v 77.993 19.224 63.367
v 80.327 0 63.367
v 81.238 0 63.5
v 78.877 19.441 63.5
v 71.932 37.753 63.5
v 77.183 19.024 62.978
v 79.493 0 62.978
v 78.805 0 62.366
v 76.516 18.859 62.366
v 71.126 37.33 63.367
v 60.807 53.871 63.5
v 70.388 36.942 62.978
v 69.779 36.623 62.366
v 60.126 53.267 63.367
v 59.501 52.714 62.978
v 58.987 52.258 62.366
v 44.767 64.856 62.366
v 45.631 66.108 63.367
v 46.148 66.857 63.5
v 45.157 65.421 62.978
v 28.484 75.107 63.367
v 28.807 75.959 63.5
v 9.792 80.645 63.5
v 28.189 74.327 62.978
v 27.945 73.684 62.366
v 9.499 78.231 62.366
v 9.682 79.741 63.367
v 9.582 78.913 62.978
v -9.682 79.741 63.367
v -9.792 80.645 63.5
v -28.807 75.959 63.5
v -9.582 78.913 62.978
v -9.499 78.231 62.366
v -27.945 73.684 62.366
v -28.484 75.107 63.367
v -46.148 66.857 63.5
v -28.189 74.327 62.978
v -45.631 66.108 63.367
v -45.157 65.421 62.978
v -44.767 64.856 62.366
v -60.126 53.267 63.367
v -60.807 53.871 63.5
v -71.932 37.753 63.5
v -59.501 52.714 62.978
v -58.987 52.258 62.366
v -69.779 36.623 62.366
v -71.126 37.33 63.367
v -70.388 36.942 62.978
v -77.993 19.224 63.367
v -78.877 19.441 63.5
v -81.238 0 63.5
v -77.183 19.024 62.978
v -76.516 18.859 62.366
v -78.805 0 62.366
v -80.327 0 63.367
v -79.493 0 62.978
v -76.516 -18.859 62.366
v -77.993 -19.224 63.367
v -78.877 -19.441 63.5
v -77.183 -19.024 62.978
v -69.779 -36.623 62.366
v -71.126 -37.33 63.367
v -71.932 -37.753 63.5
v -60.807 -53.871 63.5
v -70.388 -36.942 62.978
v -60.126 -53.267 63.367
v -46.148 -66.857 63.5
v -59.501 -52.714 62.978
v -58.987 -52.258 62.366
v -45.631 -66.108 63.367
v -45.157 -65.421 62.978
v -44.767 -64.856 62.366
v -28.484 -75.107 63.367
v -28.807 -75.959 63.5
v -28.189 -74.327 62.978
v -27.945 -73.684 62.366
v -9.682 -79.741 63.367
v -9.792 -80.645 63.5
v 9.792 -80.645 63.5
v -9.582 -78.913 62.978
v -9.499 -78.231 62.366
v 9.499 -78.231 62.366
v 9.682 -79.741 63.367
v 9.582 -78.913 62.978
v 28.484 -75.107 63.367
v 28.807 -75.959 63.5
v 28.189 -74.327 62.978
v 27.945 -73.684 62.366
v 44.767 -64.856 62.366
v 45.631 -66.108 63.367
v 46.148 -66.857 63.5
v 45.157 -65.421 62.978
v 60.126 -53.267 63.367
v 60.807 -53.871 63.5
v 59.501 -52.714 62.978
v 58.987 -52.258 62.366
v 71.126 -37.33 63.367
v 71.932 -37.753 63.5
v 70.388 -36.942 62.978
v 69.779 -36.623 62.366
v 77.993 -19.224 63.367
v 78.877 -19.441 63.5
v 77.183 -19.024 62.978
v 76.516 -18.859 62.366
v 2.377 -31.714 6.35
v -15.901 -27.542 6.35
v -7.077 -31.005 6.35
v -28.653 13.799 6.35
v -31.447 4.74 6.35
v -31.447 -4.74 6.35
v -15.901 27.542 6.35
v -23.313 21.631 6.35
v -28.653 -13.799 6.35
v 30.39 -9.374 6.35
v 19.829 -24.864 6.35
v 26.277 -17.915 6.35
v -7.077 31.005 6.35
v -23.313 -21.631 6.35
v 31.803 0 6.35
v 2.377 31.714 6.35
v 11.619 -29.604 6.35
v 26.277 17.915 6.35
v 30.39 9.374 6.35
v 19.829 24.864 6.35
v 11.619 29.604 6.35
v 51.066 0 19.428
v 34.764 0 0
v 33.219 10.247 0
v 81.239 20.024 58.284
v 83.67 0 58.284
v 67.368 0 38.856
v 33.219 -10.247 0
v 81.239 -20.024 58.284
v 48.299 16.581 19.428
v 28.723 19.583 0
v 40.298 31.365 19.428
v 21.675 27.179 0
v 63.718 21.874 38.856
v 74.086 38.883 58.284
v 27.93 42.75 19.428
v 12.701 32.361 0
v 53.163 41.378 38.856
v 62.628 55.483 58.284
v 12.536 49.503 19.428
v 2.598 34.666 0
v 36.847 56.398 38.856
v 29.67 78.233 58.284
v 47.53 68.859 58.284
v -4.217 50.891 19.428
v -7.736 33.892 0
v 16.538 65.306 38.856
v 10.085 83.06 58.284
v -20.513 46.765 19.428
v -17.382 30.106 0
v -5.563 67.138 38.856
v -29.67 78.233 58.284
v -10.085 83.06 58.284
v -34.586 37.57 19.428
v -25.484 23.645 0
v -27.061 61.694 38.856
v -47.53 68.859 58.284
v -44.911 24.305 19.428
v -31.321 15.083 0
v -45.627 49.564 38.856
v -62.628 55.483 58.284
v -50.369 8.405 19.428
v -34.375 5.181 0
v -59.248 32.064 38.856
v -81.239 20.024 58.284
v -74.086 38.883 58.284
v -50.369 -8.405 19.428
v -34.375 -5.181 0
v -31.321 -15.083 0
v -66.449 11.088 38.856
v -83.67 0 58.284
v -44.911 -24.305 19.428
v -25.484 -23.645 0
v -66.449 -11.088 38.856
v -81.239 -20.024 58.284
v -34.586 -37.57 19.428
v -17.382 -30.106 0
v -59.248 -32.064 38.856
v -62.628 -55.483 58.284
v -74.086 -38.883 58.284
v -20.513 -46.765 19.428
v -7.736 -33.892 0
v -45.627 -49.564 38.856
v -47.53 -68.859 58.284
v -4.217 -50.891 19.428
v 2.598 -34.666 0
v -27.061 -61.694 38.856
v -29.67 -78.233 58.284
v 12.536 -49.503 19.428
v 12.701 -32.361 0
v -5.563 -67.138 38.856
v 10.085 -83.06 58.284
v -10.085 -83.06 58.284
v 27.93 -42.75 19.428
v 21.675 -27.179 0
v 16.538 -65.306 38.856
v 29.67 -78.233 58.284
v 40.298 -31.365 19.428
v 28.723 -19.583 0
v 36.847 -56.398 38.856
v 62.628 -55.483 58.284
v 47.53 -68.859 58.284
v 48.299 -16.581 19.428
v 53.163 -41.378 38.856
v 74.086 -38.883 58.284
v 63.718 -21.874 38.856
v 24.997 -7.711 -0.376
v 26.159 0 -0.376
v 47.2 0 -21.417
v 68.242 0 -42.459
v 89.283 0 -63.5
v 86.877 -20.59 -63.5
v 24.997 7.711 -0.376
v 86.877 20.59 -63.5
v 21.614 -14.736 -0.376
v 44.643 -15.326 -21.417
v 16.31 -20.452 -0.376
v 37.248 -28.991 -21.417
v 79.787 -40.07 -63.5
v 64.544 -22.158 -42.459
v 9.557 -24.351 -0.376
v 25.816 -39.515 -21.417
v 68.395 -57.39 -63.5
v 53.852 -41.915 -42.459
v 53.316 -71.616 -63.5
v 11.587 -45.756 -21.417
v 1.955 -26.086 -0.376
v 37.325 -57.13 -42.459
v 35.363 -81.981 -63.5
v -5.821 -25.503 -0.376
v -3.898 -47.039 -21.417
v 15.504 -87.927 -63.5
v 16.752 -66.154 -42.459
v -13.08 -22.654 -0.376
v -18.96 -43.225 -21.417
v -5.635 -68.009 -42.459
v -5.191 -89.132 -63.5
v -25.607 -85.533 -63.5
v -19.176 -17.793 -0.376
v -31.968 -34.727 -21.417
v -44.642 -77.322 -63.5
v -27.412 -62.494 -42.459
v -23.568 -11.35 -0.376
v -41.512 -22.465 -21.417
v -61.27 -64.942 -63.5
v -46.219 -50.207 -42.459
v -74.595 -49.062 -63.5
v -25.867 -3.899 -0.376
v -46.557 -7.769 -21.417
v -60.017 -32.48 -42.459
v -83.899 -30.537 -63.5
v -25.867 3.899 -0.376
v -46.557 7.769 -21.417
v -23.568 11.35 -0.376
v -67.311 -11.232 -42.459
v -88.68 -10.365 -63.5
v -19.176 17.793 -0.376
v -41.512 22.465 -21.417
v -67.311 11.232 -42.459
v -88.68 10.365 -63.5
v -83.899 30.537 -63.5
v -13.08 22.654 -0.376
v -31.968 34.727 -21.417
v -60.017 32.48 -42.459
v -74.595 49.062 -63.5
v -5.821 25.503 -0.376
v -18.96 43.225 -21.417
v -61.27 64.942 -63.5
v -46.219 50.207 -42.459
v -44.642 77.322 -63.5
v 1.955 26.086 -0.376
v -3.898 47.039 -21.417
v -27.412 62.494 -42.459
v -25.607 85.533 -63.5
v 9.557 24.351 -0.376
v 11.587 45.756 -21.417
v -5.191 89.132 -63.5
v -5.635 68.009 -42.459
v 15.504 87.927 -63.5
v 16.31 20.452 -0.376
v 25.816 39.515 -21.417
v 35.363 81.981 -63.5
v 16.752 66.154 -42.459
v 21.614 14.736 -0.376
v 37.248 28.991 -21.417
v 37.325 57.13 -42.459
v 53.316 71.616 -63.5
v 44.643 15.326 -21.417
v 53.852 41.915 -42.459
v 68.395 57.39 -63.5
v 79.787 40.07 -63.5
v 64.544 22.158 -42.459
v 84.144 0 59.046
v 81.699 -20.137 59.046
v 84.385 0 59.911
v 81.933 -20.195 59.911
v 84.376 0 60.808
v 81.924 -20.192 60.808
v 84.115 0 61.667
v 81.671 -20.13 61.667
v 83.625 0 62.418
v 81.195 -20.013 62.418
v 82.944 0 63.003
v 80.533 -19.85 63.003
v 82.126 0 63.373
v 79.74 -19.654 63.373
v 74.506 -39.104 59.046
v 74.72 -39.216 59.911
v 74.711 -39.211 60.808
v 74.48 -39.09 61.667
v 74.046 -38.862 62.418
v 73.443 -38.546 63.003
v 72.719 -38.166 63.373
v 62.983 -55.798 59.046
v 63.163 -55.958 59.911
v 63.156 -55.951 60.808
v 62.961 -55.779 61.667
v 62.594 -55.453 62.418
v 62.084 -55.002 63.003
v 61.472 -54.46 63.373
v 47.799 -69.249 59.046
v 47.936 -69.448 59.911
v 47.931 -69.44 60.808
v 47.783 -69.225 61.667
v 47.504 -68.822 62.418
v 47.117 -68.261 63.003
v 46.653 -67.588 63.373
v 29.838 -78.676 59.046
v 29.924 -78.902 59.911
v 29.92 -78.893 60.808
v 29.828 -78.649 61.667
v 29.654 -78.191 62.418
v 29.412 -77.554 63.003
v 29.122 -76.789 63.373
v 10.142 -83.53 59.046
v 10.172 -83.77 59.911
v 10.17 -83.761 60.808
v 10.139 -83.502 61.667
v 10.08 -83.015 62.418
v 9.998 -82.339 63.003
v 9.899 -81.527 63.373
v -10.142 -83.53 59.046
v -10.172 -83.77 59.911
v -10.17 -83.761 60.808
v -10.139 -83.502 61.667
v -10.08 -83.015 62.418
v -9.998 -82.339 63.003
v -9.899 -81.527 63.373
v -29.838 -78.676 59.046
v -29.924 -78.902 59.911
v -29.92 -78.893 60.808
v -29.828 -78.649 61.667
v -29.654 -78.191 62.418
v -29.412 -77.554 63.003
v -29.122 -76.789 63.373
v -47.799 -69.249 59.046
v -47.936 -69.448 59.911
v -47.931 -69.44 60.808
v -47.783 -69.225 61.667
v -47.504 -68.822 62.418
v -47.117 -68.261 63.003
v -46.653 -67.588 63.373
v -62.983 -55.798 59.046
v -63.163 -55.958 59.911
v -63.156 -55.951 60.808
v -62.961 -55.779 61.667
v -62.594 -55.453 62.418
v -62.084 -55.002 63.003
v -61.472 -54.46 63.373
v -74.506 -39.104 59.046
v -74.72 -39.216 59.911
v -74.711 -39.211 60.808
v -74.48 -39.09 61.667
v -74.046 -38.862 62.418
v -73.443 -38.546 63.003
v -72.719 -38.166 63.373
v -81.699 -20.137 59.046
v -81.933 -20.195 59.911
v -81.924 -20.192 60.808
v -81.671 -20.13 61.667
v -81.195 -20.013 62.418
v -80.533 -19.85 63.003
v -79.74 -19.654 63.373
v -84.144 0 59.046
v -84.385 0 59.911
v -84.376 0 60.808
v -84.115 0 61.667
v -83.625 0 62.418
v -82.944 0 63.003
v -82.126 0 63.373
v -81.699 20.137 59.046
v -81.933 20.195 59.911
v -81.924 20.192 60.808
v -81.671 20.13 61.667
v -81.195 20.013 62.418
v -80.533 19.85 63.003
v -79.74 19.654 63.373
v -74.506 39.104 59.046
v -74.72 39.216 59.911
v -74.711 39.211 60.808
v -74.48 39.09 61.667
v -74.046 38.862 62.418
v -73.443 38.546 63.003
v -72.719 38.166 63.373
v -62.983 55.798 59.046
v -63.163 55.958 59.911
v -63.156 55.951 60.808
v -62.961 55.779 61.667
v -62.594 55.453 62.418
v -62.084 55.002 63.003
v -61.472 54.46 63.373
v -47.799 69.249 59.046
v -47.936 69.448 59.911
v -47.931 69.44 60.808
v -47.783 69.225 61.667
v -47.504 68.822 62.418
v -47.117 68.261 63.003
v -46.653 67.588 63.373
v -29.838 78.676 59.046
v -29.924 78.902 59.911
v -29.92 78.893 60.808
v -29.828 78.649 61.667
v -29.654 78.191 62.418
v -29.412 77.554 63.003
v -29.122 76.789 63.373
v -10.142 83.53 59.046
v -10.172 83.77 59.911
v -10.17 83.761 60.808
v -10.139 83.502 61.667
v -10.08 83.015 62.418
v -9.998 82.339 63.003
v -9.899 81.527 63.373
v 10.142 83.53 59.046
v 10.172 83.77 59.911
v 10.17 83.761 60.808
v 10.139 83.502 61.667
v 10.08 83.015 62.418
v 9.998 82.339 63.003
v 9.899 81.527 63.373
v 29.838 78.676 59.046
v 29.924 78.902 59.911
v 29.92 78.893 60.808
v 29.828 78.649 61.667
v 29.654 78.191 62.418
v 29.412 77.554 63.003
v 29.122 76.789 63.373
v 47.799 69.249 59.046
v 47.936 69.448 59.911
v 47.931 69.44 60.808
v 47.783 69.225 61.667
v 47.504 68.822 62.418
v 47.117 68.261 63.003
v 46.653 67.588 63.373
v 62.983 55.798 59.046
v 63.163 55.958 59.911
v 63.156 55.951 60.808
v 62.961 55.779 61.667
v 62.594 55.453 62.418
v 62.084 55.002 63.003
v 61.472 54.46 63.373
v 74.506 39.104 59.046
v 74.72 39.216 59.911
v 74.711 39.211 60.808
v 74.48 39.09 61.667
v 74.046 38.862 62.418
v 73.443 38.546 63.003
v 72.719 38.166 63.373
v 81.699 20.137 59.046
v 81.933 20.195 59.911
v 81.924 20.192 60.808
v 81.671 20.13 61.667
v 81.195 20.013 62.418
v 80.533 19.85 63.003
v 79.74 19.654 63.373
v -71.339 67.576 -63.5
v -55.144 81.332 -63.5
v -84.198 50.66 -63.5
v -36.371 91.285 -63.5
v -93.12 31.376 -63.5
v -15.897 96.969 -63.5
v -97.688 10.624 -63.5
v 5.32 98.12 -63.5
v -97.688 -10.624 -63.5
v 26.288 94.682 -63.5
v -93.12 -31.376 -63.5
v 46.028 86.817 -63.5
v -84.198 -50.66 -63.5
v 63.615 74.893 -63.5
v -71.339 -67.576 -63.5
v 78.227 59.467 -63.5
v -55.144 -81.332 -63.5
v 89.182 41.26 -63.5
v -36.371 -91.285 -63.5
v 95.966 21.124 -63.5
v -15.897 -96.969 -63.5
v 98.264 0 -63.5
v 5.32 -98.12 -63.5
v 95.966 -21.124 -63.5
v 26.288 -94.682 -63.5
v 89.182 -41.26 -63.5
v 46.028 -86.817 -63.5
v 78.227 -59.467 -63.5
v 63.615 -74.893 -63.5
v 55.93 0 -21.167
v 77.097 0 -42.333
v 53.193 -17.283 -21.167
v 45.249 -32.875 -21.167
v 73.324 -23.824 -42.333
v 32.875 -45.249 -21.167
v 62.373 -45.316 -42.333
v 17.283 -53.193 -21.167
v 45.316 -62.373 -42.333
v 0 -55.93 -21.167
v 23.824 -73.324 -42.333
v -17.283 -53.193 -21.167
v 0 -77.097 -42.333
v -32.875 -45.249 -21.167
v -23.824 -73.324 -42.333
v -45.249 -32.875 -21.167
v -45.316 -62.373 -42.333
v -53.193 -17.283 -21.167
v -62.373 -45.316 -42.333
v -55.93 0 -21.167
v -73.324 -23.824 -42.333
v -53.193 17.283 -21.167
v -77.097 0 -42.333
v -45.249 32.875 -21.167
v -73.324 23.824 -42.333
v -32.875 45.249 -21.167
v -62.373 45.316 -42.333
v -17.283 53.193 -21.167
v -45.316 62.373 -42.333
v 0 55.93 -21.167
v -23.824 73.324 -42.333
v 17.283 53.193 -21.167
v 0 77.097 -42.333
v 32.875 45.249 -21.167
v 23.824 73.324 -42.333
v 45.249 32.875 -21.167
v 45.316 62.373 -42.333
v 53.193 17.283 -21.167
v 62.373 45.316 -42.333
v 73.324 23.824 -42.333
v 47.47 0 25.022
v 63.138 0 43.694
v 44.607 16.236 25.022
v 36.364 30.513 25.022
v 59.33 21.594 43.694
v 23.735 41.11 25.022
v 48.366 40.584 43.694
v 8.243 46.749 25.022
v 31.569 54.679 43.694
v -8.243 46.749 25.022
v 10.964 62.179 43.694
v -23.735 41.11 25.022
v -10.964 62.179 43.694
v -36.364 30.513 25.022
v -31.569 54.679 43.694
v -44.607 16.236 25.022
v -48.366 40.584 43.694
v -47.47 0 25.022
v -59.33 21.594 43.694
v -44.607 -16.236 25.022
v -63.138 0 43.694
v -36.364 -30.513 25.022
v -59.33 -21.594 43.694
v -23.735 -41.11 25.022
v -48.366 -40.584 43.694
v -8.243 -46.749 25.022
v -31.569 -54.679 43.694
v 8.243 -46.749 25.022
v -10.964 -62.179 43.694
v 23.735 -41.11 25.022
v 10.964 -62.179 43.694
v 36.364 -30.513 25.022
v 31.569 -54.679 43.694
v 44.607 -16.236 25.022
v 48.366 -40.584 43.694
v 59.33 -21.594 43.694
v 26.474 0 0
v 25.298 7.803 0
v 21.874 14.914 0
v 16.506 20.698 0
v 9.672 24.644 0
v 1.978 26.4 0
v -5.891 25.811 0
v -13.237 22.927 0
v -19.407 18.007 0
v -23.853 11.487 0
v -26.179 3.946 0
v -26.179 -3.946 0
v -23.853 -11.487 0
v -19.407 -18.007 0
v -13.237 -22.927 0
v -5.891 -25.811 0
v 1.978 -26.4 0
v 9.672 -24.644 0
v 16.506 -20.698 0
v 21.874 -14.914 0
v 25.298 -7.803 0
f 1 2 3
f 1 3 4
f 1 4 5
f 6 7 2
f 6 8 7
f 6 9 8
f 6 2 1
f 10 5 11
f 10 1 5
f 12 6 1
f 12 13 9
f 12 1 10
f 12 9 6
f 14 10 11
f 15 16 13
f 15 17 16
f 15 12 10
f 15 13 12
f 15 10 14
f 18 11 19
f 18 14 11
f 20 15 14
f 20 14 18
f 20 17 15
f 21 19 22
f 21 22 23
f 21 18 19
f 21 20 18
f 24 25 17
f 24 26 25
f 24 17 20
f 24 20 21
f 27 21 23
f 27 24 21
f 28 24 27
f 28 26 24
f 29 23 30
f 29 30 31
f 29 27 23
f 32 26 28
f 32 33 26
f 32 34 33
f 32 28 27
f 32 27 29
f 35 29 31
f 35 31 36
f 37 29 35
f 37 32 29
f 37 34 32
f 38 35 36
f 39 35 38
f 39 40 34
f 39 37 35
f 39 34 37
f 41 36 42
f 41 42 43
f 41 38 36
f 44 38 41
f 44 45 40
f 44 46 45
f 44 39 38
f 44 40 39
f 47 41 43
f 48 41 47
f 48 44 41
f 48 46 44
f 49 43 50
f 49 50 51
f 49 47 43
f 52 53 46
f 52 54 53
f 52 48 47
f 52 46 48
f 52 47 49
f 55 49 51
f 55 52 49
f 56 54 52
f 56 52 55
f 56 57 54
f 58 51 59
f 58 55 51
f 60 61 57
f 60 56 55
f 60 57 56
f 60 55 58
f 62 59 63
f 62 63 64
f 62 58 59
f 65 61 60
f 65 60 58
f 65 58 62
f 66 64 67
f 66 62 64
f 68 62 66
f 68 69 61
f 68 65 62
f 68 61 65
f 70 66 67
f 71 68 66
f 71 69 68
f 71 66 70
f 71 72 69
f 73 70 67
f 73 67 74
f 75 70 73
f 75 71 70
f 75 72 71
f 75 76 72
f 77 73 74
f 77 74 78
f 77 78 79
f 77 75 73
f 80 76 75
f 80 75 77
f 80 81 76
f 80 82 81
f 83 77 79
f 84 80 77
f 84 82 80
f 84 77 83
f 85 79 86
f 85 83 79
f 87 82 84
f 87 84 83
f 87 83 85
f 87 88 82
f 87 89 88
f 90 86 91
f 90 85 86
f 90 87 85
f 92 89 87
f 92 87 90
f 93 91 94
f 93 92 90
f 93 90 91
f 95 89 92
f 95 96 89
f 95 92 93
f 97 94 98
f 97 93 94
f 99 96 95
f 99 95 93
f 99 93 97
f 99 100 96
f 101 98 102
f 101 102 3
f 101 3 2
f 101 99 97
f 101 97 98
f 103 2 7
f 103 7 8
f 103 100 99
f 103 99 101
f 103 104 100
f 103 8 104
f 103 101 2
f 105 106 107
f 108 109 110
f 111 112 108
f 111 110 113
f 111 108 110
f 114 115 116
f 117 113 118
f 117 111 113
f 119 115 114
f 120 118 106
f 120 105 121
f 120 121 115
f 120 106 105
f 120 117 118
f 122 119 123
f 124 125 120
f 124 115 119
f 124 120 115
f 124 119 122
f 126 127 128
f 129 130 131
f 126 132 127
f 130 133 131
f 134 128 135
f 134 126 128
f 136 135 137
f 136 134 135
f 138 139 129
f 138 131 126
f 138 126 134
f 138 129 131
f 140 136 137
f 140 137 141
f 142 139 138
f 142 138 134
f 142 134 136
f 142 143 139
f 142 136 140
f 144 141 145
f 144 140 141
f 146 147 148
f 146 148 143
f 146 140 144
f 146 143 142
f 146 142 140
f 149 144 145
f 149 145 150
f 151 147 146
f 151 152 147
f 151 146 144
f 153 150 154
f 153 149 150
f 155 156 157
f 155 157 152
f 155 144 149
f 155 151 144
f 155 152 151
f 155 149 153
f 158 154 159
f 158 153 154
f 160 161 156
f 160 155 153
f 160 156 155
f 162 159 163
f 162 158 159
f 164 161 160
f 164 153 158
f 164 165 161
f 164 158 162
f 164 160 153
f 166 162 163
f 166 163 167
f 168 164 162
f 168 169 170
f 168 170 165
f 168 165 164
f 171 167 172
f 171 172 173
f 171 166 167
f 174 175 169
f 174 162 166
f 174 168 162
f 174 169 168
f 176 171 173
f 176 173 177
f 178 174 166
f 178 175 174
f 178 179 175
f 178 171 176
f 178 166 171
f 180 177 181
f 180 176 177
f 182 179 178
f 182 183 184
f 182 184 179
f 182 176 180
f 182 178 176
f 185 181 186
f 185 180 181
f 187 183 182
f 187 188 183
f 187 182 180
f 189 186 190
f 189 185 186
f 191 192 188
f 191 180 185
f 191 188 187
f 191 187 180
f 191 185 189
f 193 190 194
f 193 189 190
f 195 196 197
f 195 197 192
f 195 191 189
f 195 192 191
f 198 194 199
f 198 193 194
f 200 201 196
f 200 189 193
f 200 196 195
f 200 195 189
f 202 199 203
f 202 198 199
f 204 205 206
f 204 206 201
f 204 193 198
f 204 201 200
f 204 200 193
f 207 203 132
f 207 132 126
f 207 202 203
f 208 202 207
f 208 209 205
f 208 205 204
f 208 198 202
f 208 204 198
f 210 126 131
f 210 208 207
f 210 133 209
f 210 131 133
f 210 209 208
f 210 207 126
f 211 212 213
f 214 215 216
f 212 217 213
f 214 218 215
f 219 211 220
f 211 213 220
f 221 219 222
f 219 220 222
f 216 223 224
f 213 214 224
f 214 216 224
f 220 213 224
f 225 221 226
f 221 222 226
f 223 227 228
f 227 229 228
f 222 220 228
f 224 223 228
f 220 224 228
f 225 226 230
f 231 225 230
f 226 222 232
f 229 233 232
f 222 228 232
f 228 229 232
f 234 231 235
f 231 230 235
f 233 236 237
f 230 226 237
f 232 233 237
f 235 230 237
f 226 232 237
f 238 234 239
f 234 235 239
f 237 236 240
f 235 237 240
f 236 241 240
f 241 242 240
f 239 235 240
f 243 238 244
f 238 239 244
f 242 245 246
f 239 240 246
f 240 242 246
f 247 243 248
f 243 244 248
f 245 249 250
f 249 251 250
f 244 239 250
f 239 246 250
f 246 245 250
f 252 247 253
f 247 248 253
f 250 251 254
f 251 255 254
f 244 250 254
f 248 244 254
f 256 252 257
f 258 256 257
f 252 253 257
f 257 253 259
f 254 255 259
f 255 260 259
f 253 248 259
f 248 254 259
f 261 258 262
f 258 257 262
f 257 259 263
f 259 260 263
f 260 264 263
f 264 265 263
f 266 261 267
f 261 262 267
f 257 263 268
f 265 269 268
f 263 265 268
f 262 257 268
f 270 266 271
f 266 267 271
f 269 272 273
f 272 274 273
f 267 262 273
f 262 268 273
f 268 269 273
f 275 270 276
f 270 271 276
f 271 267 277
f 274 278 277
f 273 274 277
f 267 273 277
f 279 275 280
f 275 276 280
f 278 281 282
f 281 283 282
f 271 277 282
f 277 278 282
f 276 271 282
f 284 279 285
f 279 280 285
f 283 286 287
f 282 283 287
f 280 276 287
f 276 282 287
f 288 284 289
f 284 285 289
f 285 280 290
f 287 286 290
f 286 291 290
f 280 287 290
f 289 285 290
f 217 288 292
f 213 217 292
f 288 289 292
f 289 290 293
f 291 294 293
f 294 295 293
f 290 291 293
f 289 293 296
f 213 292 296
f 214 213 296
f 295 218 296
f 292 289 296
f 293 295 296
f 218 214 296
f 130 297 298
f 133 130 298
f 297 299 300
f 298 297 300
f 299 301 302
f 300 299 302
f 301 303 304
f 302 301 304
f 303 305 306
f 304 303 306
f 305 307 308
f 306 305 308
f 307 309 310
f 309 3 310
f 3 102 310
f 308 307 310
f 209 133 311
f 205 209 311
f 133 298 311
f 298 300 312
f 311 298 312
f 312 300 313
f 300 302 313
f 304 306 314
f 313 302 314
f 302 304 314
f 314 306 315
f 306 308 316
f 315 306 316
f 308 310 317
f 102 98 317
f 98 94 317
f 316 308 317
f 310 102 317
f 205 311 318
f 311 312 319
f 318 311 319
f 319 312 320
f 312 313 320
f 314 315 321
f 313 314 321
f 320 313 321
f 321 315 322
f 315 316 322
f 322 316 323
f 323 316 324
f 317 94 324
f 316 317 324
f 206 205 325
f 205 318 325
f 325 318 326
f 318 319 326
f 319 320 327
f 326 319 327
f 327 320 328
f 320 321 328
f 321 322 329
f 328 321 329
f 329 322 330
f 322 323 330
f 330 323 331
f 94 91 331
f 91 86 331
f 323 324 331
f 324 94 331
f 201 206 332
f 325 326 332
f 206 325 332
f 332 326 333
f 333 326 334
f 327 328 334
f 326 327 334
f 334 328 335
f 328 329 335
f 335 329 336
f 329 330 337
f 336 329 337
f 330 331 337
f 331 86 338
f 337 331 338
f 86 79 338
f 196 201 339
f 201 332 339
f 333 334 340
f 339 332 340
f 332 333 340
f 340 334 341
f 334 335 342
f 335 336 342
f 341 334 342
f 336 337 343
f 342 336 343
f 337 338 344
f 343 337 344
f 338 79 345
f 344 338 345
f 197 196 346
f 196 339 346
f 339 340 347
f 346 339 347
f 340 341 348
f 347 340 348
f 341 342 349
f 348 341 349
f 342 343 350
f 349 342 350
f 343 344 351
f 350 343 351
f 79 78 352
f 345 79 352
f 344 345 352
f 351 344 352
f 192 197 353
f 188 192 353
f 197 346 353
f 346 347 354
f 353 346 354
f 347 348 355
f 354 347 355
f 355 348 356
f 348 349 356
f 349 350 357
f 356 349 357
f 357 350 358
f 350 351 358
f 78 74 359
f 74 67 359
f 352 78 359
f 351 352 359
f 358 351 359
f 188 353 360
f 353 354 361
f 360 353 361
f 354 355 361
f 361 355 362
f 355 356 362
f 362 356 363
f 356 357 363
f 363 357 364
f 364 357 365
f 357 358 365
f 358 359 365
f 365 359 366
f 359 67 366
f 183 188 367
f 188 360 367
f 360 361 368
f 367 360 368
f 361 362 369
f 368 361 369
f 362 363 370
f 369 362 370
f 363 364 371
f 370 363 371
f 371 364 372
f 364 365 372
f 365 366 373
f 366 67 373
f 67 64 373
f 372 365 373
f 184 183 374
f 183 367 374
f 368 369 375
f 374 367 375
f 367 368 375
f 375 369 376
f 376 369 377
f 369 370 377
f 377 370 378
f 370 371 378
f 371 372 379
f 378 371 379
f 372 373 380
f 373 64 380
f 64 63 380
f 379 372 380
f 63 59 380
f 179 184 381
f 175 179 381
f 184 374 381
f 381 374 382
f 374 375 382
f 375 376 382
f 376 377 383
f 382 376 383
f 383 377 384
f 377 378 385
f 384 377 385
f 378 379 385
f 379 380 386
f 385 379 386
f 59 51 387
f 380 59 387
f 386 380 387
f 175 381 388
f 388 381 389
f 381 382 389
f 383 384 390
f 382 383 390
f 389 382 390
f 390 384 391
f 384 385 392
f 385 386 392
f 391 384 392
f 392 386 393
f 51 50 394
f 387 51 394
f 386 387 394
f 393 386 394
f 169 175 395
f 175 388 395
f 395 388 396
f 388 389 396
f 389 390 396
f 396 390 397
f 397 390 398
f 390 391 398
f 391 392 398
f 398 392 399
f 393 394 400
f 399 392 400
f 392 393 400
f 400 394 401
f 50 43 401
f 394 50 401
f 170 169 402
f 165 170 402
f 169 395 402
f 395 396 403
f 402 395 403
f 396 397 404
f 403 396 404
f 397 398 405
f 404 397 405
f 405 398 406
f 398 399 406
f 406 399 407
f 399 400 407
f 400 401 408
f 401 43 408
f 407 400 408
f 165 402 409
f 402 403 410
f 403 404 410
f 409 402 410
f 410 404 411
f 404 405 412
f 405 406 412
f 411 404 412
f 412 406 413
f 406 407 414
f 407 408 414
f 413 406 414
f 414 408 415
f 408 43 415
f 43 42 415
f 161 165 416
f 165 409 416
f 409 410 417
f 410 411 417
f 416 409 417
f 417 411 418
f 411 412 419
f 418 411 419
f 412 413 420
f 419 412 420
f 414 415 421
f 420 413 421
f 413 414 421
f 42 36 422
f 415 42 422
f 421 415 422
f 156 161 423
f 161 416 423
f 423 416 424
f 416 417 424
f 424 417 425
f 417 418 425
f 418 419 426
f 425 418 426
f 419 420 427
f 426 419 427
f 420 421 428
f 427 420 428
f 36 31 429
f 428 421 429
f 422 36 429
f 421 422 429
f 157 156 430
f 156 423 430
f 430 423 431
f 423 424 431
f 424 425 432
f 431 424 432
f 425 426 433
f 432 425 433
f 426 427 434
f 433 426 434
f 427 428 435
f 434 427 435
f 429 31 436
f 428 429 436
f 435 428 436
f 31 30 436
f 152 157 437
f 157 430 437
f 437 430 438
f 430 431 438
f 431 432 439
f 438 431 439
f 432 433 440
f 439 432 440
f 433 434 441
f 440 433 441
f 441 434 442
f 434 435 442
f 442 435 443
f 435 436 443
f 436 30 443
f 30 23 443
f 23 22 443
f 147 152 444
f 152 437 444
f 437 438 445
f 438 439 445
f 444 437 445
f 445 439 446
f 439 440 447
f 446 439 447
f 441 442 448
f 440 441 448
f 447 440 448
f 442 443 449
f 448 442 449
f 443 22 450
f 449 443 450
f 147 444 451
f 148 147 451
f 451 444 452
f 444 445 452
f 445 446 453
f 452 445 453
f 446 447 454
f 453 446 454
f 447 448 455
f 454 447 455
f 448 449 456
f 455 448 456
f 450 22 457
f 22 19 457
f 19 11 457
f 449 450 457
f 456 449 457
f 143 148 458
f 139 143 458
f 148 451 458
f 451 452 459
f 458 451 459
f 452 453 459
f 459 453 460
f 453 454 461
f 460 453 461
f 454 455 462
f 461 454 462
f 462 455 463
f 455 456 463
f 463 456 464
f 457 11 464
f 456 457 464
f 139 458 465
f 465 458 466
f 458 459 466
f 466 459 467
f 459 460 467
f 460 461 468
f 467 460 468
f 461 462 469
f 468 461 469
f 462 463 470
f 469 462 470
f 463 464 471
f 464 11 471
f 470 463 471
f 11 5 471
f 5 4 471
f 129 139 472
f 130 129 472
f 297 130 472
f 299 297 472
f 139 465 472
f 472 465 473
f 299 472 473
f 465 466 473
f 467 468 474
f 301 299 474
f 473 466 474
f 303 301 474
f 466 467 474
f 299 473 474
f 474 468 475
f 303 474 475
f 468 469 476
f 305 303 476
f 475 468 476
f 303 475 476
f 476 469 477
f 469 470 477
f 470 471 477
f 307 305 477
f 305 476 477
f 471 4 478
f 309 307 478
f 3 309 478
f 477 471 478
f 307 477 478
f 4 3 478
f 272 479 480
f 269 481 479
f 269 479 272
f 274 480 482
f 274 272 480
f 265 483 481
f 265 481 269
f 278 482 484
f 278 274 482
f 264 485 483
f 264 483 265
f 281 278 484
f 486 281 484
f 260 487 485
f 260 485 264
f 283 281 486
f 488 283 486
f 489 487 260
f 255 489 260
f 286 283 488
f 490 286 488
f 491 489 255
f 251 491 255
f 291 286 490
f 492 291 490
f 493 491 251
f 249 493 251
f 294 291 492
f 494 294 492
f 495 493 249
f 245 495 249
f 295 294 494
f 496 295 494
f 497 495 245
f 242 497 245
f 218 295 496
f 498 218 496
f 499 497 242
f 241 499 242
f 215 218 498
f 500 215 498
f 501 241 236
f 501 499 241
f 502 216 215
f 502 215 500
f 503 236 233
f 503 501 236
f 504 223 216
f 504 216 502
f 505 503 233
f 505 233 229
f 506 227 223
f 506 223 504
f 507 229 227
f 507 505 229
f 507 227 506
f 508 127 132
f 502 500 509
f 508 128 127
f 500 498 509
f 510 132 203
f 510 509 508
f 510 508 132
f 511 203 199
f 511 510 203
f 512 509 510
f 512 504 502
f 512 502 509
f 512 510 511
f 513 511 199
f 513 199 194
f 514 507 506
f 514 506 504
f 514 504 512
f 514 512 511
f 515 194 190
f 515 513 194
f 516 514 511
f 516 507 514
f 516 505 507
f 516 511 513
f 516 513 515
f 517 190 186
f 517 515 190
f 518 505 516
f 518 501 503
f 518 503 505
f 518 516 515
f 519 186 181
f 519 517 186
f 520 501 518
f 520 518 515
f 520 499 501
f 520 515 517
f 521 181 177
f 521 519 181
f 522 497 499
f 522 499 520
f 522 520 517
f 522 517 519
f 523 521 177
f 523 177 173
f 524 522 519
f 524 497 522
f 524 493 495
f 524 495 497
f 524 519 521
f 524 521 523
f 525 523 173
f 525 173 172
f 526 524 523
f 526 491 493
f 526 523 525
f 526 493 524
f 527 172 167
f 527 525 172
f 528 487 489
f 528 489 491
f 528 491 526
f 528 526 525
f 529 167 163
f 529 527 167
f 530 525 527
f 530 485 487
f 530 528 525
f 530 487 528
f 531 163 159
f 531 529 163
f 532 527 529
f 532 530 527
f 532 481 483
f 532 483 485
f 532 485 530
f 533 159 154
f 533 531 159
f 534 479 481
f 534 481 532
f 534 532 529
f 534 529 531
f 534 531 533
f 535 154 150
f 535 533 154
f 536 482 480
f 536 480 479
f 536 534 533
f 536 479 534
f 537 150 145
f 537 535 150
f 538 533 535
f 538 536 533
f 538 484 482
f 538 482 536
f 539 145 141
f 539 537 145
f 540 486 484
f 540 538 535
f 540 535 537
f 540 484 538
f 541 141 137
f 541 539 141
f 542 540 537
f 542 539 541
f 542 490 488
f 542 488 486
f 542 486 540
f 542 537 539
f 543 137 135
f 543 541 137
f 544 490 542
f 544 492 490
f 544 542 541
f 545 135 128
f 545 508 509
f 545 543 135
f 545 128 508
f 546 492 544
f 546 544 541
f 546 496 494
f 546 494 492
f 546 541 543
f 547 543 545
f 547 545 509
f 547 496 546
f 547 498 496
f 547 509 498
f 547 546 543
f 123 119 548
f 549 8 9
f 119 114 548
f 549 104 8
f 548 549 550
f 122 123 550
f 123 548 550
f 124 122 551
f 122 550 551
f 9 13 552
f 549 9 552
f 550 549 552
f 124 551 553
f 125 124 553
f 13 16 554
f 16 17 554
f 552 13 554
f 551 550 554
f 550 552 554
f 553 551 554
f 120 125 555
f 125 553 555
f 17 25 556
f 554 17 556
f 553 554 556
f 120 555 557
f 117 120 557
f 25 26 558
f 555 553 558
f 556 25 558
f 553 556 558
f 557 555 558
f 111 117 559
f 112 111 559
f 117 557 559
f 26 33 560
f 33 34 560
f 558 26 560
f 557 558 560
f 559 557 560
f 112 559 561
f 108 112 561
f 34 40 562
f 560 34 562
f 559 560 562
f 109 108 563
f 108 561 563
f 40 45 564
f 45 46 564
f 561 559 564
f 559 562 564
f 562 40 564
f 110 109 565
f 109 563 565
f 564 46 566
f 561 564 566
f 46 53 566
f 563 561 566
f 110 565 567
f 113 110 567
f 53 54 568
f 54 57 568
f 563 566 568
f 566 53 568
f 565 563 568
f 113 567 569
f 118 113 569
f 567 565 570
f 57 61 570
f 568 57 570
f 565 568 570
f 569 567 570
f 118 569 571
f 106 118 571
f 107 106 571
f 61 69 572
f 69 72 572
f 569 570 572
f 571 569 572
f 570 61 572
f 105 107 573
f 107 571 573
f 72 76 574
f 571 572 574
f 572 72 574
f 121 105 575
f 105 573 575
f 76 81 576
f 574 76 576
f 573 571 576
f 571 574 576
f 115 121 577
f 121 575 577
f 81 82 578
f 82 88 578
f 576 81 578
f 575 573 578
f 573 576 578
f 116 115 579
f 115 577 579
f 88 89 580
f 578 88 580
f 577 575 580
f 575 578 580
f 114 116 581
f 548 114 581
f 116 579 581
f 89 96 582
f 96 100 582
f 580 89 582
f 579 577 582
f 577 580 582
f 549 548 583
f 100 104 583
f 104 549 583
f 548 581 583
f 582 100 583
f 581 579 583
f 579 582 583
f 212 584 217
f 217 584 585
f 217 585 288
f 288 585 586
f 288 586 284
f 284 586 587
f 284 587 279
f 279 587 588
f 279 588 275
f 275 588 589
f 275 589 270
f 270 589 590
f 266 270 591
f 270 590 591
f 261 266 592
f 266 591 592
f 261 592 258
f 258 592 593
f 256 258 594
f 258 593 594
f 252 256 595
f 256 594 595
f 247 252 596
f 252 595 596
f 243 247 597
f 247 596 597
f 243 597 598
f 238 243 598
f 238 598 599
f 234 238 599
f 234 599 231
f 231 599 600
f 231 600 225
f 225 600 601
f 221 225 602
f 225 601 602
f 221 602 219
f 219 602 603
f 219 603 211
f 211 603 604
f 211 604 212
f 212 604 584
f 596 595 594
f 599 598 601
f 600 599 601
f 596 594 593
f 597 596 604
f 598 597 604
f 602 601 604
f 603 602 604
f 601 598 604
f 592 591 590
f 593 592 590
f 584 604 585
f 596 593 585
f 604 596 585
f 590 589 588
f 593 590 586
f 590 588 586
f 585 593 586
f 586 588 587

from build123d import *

# Parameters (mm, degrees)
F0_R      = 34.7636302152
F1_DEPTH  = 63.5
F1_TAPER  = -40
F2_T      = -6.35
F3_R      = 3.17499
F1_FACE_R = 34.7636302152
F4_DEPTH  = 63.5
F4_TAPER  = -45
F5_T      = -6.35


# Not quite as in the source:
# - a fillet or chamfer is up to 0.001 mm smaller than in the source, because OpenCascade refuses the exact size


with BuildPart() as f1:
    # F0 (on Top) → F1 (new body)
    with BuildSketch(Plane.XY):
        Circle(F0_R)
    extrude(amount=F1_DEPTH, taper=F1_TAPER)

    # F2
    f2_openings = [f1.faces().sort_by_distance(p)[0] for p in [
        (0, 0, 63.5),
    ]]
    offset(amount=F2_T, openings=f2_openings, kind=Kind.INTERSECTION)

    # F3 (radius 3.175 in the source; OpenCascade refuses exactly that, so slightly less here)
    f3_edges = [f1.edges().sort_by_distance(p)[0] for p in [
        (-88.046457, 0, 63.5),
        (-79.757121, 0, 63.5),
    ]]
    fillet(f3_edges, radius=F3_R)

    # F1_face (on face) → F4 (join)
    with BuildSketch(Plane(origin=(0, 0, 0), x_dir=(1, 0, 0), z_dir=(0, 0, -1))):
        Circle(F1_FACE_R)
    extrude(amount=F4_DEPTH, taper=F4_TAPER)

    # F5
    f5_openings = [f1.faces().sort_by_distance(p)[0] for p in [
        (0, 0, -63.5),
    ]]
    offset(amount=F5_T, openings=f5_openings, kind=Kind.INTERSECTION)


solid = f1.part
